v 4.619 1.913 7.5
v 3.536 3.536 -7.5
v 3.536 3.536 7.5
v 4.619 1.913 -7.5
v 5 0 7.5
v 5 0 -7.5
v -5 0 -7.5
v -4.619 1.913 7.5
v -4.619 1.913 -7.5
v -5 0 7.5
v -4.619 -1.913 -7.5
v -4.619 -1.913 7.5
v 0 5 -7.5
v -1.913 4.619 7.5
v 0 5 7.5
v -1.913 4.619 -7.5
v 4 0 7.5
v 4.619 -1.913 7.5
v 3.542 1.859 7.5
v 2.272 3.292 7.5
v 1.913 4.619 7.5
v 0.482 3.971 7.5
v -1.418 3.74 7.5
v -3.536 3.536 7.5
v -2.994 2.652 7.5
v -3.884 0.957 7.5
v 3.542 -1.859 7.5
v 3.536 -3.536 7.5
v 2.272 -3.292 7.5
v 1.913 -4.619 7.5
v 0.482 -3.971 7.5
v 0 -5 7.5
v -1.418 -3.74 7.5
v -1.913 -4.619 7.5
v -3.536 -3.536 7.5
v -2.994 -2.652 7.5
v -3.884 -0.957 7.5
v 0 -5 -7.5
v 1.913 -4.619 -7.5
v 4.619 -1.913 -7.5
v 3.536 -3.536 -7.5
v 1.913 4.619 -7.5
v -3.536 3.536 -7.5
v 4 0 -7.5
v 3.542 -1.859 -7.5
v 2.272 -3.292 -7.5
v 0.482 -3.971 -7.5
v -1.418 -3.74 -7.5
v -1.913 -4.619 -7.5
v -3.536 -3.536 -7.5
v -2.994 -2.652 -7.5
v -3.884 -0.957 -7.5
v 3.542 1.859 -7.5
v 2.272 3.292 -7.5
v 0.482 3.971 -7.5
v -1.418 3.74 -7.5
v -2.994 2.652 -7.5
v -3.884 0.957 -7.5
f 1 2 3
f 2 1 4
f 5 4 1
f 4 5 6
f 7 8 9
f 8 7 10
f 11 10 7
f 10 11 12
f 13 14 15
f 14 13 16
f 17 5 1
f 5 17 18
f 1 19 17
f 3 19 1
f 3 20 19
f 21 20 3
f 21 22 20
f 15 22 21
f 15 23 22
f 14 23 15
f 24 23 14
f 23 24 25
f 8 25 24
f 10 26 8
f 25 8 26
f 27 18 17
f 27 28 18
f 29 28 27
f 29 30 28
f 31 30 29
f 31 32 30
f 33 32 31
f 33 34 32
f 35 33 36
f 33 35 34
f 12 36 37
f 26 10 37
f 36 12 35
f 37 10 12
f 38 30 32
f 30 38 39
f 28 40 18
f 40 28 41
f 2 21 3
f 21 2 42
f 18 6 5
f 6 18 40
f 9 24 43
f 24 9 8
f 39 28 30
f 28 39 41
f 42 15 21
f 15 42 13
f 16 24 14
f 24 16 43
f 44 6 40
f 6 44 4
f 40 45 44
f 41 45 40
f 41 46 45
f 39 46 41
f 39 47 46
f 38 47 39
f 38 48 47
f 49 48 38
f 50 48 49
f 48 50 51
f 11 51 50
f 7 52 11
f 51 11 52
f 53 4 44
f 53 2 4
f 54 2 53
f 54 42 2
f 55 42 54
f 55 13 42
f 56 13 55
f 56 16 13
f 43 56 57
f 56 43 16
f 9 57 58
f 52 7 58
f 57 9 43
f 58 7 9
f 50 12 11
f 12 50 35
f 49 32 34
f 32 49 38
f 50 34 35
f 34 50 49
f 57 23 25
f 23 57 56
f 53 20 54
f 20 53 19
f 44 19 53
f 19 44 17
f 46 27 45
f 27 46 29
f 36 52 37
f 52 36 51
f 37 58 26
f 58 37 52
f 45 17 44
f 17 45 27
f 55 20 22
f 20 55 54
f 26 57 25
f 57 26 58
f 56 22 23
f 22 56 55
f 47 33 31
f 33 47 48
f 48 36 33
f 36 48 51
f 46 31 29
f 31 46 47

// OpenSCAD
// Parameters
length = 15; //[8:30:1]
center = 1; //[0:1:1]
forced_id = 0; //[0:30:0.5]
type_od = 10; //[5:20:0.5]
type_id = 8; //[3:18:0.5]
id_effective = (forced_id > 0 ? forced_id : type_id); //[3:18:0.5]
eps_overlap = 0.8; //[0.2:2:0.1]
use_path_sweep = 0; //[0:1:1]

// Tubing - complete geometry
module tubing() {
  color([0.2, 0.2, 0.2]) {
    difference() {
      // Outer cylinder
      cylinder(r=type_od/2, h=length, center=true);
      // Inner bore
      cylinder(r=id_effective/2, h=length + 2*eps_overlap, center=true);
    }
  }
}

// Assembly
module assembly() {
  translate([0, 0, (center == 1 ? 0 : length/2)]) tubing();
}

assembly();
